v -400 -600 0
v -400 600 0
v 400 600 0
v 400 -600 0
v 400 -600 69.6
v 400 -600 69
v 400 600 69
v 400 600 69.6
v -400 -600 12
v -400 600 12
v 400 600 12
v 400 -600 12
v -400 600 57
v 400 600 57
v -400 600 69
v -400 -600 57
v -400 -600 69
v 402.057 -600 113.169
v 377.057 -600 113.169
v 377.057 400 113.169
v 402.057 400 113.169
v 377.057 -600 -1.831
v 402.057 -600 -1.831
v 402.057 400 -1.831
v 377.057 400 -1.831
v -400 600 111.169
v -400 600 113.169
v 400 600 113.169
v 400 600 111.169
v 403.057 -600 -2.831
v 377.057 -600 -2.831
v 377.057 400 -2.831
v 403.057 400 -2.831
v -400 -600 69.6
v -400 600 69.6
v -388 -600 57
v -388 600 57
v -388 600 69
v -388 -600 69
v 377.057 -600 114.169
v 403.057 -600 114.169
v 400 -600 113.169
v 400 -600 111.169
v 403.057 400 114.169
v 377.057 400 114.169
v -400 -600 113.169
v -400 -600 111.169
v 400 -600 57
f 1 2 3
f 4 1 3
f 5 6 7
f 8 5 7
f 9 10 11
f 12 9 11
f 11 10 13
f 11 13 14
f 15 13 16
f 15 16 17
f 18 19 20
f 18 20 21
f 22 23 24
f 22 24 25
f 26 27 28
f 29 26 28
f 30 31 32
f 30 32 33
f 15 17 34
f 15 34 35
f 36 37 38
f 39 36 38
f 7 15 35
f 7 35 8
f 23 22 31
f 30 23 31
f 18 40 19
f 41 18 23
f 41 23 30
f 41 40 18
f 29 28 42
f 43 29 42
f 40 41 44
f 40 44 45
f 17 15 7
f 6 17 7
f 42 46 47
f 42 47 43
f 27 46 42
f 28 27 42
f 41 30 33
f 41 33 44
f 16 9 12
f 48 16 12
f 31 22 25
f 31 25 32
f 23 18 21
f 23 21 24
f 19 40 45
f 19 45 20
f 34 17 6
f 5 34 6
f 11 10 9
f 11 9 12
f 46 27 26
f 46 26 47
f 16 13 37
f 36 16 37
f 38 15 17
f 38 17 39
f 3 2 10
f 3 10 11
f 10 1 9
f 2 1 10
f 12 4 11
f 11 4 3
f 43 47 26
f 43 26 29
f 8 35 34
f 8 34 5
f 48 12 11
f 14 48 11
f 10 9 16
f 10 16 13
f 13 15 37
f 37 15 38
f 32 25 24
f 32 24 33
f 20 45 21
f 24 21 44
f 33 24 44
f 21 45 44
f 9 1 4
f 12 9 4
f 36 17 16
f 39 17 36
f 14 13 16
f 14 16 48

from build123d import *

# Parameters (mm, degrees)
F0_W      = 800
F0_H      = 1200
F1_DEPTH  = 12
F2_DEPTH  = 45
F3_W      = 12
F3_H      = 12
F4_DEPTH  = 1200
F5_W      = 800
F5_H      = 1200
F6_DEPTH  = 0.6
F8_DEPTH  = 1000
F9_W      = 800
F9_H      = 1200
F10_DEPTH = 2


with BuildPart() as f1:
    # F0 (on Top) → F1 (new body)
    with BuildSketch(Plane.XY):
        Rectangle(F0_W, F0_H)
    extrude(amount=F1_DEPTH)


with BuildPart() as f2:
    # F2 (new): a face of the model
    f2_faces = [f1.part.faces().sort_by_distance(p)[0] for p in [
        (0, 0, 12),
    ]]
    extrude(f2_faces, amount=F2_DEPTH)


with BuildPart() as f4:
    # F3 (on face) → F4 (new body, through all)
    with BuildSketch(Plane.XZ.offset(600)):
        with Locations((-394, 63)):
            Rectangle(F3_W, F3_H)
    extrude(amount=-F4_DEPTH)


with BuildPart() as f6:
    # F5 (on face) → F6 (new body)
    with BuildSketch(Plane.XY.offset(69)):
        Rectangle(F5_W, F5_H)
    extrude(amount=F6_DEPTH)


with BuildPart() as f8:
    # F7 (on face) → F8 (new body)
    with BuildSketch(Plane.XZ.offset(600)):
        Polygon((377.0572900772, 114.1687498512), (377.0572900772, 113.1687498512), (402.0572900772, 113.1687498512), (402.0572900772, -1.8312501488), (377.0572900772, -1.8312501488), (377.0572900772, -2.8312501488), (403.0572900772, -2.8312501488), (403.0572900772, 114.1687498512), align=None)
    extrude(amount=-F8_DEPTH)


with BuildPart() as f10:
    # F9 (on face) → F10 (new body)
    with BuildSketch(Plane(origin=(0, 0, 113.1687498512), x_dir=(1, 0, 0), z_dir=(0, 0, -1))):
        Rectangle(F9_W, F9_H)
    extrude(amount=F10_DEPTH)


solid = Compound([f1.part, f2.part, f4.part, f6.part, f8.part, f10.part])
